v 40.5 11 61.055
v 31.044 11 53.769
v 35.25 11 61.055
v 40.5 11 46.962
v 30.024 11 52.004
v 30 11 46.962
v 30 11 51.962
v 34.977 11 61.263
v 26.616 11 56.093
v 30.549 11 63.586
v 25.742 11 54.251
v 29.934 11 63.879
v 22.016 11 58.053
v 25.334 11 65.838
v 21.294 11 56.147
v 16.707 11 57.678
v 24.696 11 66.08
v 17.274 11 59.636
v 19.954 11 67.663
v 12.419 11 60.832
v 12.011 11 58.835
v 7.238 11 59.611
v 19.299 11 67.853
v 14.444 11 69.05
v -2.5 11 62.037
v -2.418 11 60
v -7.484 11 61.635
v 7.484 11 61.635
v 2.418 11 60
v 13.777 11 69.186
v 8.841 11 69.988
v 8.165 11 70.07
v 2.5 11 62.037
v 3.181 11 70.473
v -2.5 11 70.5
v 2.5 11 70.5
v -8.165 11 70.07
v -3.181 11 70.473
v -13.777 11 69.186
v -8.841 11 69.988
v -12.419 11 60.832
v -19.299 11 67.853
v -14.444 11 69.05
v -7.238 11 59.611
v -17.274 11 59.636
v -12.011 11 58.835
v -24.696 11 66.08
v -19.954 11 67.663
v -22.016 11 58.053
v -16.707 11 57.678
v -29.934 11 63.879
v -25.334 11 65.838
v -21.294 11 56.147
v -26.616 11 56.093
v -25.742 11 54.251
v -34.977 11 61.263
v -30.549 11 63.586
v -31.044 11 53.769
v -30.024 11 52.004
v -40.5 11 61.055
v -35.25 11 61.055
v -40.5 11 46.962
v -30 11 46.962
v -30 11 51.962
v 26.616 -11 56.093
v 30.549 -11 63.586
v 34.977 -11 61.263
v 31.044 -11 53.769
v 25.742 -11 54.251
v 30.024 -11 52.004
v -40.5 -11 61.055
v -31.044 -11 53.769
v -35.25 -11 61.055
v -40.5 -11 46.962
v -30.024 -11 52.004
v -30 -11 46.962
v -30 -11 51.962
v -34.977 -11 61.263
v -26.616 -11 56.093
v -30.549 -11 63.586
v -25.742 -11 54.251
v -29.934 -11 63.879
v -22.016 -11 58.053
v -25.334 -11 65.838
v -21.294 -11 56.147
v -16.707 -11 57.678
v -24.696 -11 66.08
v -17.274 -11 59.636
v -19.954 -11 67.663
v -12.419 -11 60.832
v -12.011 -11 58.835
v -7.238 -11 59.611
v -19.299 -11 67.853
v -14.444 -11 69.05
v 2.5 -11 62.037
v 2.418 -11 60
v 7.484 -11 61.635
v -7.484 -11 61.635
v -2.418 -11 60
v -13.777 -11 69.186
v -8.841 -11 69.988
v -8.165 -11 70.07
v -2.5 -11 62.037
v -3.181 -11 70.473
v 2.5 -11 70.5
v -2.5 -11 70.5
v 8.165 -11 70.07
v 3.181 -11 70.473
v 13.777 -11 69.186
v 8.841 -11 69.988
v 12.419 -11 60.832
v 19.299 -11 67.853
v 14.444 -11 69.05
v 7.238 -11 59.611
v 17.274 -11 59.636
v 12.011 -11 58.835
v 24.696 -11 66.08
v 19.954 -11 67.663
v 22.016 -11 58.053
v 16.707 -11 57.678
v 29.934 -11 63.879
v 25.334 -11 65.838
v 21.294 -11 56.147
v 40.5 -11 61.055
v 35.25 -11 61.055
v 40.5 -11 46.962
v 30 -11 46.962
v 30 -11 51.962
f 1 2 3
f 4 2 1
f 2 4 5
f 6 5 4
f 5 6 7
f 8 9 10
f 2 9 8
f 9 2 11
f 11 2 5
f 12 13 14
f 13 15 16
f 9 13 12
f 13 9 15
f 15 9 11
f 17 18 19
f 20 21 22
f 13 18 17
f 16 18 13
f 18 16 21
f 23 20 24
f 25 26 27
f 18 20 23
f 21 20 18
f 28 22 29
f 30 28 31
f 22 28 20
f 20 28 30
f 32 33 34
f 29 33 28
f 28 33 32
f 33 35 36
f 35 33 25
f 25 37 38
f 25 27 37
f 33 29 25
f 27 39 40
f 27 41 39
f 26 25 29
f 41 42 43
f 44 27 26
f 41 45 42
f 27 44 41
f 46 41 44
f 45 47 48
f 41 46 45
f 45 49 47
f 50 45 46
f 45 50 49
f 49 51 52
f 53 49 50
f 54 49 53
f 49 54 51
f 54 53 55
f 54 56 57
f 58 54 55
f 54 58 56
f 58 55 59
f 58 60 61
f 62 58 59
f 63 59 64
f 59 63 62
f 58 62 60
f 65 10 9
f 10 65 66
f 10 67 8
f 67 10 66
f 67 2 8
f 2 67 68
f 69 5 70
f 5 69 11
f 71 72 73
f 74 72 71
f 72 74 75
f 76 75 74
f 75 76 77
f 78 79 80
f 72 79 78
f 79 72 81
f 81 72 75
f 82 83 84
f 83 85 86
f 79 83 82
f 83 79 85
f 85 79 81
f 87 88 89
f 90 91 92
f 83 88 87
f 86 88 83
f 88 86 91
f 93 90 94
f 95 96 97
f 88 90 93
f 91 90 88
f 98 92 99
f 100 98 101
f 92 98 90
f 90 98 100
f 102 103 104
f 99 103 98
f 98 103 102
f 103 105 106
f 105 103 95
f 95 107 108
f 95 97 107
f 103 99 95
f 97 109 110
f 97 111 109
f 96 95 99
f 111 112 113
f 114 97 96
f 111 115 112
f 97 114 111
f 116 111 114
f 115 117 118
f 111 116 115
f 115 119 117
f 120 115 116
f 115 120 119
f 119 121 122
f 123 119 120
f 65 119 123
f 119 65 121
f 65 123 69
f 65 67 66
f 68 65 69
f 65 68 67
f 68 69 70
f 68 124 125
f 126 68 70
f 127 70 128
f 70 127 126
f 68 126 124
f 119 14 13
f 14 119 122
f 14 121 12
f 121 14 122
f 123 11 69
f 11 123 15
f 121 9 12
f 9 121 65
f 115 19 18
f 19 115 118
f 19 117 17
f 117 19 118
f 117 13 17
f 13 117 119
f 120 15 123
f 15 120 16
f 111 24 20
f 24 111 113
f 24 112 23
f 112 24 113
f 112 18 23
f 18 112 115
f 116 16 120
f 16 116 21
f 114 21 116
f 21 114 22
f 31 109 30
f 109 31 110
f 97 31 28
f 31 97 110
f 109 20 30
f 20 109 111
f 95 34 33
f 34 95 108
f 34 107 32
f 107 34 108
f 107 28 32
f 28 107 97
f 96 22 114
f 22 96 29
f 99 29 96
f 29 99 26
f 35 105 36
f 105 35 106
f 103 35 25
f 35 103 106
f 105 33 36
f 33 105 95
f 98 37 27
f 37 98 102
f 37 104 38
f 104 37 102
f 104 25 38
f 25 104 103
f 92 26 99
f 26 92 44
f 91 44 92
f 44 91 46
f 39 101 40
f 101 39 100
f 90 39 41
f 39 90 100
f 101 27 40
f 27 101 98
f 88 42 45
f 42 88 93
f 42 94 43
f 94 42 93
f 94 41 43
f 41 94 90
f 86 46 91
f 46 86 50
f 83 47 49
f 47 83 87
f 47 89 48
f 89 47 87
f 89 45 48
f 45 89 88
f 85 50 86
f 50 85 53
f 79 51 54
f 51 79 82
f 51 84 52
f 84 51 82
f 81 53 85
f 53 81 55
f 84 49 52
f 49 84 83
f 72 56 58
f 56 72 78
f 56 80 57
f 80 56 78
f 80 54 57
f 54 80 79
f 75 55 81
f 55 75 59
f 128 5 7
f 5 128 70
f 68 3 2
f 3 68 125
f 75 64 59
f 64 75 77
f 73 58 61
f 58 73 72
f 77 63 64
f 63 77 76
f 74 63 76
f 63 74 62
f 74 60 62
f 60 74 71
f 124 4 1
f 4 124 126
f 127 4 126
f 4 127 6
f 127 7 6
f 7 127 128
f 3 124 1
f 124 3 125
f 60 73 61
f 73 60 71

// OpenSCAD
// Dimensions d'une brique
L = 22;   // longueur (profondeur)
l = 10.5; // largeur (épaisseur radiale)
h = 5;    // hauteur (suit l'arc)

// Paramètres de l'arc
corde = 60;           // distance entre les points d'appui de l'arc
rayon = 60;           // rayon en mm (rayon intérieur)

// Angle de l'arc en degrés
 angle = 2 * asin(corde / (2 * rayon));

module arc(angle, rayon) {
    // Conversion en radians pour les calculs internes
    angle_rad_local = angle * (PI / 180);
    
    // Longueur de l'arc au rayon donné
    longueur_arc = rayon * angle_rad_local;
    
    // Nombre de briques nécessaires
    nb_briques = ceil(longueur_arc / h);
    
    // Calcul de la longueur d'arc disponible par brique
    // On divise la longueur totale d'arc par le nombre de briques
    longueur_par_brique = longueur_arc / nb_briques;
    
    // Angle entre chaque brique (basé sur la longueur réelle par brique)
    angle_brique = (longueur_par_brique / rayon) * (180 / PI);
    
    // Angle complémentaire pour que l'arc commence à l'horizontale
    angle_complementaire = 90 - (angle / 2);
    
    // Décalage radial pour que les briques ne se chevauchent pas
    rayon_centre = rayon + l/2;
    
    for (i = [0 : nb_briques - 1]) {
        // Angle de la brique le long de l'arc (centrée sur sa position)
        angle_arc = i * angle_brique + angle_brique/2;
        
        // Angle pour le calcul de la position (angle du rayon)
        angle_rayon = angle_complementaire + angle_arc;
        
        // Position sur l'arc (au centre de la brique en épaisseur)
        x = rayon_centre * cos(angle_rayon);
        z = rayon_centre * sin(angle_rayon);
        
        // Rotation de la brique : la tangente est perpendiculaire au rayon
        rotation_y = -(angle_rayon);
        
        translate([x, 0, z])
        rotate([0, rotation_y, 0])
        cube([l, L, h], center=true);
    }
}
// Exemple d'utilisation
color("red") arc(angle, rayon);

 angle_complementaire = 90 - (angle / 2);

module prism(length, width, height)
{
    polyhedron(
        points=[
            [0,   0,   0],   // 0
            [width, 0,   height], // 1
            [width, length, height], // 2
            [0,   length, 0],   // 3
            [width, 0,   0],   // 4
            [width, length, 0]    // 5
        ],
        faces=[
            [3,2,1,0], // top sloping face (A)
            [5,4,1,2],  // vertical rectangular face (B)
            [4,5,3,0], // bottom face (C)
            [1,4,0], // rear triangular face (D)
            [5,2,3] // front triangular face (E)
        ]
    );
}


length = L;
height = l* sin(angle_complementaire);
width = l* cos(angle_complementaire);


// Position du point sur l'arc à l'angle 0 (début de l'arc)
x_start = rayon * cos(angle_complementaire);
z_start = rayon * sin(angle_complementaire);

xs = x_start;
ys = -L/2; 
zs =  z_start;
 
translate([xs, ys, zs])
color("yellow") prism(length, width, height);

rotate([0, 0, 180])
translate([xs, ys, zs])
color("yellow") prism(length, width, height);

module cube_assise(longueur,largeur,hauteur){
cube([longueur,largeur,hauteur]);
  }

longueur=l;
largeur=L;
hauteur=h;
xc = xs+l;
yc = -L/2; 
zc =  zs-h; 
translate([-xc, yc, zc])
color("yellow") cube_assise(longueur,largeur,hauteur);
  
rotate([0, 0, 180])
translate([-xc, yc, zc])
color("yellow") cube_assise(longueur,largeur,hauteur);


longueur1=height;
largeur1=L;
hauteur1=l-width;
  
xb=zs+height;
yb=yc+L;
zb=xc-hauteur1;
rotate([0, 90, 0])
translate([-xb, -yb, zb])
color("yellow") cube_assise(longueur1,largeur1,hauteur1);

rotate([0, 90, 180])
translate([-xb, -yb, zb])
color("yellow") cube_assise(longueur1,largeur1,hauteur1);
